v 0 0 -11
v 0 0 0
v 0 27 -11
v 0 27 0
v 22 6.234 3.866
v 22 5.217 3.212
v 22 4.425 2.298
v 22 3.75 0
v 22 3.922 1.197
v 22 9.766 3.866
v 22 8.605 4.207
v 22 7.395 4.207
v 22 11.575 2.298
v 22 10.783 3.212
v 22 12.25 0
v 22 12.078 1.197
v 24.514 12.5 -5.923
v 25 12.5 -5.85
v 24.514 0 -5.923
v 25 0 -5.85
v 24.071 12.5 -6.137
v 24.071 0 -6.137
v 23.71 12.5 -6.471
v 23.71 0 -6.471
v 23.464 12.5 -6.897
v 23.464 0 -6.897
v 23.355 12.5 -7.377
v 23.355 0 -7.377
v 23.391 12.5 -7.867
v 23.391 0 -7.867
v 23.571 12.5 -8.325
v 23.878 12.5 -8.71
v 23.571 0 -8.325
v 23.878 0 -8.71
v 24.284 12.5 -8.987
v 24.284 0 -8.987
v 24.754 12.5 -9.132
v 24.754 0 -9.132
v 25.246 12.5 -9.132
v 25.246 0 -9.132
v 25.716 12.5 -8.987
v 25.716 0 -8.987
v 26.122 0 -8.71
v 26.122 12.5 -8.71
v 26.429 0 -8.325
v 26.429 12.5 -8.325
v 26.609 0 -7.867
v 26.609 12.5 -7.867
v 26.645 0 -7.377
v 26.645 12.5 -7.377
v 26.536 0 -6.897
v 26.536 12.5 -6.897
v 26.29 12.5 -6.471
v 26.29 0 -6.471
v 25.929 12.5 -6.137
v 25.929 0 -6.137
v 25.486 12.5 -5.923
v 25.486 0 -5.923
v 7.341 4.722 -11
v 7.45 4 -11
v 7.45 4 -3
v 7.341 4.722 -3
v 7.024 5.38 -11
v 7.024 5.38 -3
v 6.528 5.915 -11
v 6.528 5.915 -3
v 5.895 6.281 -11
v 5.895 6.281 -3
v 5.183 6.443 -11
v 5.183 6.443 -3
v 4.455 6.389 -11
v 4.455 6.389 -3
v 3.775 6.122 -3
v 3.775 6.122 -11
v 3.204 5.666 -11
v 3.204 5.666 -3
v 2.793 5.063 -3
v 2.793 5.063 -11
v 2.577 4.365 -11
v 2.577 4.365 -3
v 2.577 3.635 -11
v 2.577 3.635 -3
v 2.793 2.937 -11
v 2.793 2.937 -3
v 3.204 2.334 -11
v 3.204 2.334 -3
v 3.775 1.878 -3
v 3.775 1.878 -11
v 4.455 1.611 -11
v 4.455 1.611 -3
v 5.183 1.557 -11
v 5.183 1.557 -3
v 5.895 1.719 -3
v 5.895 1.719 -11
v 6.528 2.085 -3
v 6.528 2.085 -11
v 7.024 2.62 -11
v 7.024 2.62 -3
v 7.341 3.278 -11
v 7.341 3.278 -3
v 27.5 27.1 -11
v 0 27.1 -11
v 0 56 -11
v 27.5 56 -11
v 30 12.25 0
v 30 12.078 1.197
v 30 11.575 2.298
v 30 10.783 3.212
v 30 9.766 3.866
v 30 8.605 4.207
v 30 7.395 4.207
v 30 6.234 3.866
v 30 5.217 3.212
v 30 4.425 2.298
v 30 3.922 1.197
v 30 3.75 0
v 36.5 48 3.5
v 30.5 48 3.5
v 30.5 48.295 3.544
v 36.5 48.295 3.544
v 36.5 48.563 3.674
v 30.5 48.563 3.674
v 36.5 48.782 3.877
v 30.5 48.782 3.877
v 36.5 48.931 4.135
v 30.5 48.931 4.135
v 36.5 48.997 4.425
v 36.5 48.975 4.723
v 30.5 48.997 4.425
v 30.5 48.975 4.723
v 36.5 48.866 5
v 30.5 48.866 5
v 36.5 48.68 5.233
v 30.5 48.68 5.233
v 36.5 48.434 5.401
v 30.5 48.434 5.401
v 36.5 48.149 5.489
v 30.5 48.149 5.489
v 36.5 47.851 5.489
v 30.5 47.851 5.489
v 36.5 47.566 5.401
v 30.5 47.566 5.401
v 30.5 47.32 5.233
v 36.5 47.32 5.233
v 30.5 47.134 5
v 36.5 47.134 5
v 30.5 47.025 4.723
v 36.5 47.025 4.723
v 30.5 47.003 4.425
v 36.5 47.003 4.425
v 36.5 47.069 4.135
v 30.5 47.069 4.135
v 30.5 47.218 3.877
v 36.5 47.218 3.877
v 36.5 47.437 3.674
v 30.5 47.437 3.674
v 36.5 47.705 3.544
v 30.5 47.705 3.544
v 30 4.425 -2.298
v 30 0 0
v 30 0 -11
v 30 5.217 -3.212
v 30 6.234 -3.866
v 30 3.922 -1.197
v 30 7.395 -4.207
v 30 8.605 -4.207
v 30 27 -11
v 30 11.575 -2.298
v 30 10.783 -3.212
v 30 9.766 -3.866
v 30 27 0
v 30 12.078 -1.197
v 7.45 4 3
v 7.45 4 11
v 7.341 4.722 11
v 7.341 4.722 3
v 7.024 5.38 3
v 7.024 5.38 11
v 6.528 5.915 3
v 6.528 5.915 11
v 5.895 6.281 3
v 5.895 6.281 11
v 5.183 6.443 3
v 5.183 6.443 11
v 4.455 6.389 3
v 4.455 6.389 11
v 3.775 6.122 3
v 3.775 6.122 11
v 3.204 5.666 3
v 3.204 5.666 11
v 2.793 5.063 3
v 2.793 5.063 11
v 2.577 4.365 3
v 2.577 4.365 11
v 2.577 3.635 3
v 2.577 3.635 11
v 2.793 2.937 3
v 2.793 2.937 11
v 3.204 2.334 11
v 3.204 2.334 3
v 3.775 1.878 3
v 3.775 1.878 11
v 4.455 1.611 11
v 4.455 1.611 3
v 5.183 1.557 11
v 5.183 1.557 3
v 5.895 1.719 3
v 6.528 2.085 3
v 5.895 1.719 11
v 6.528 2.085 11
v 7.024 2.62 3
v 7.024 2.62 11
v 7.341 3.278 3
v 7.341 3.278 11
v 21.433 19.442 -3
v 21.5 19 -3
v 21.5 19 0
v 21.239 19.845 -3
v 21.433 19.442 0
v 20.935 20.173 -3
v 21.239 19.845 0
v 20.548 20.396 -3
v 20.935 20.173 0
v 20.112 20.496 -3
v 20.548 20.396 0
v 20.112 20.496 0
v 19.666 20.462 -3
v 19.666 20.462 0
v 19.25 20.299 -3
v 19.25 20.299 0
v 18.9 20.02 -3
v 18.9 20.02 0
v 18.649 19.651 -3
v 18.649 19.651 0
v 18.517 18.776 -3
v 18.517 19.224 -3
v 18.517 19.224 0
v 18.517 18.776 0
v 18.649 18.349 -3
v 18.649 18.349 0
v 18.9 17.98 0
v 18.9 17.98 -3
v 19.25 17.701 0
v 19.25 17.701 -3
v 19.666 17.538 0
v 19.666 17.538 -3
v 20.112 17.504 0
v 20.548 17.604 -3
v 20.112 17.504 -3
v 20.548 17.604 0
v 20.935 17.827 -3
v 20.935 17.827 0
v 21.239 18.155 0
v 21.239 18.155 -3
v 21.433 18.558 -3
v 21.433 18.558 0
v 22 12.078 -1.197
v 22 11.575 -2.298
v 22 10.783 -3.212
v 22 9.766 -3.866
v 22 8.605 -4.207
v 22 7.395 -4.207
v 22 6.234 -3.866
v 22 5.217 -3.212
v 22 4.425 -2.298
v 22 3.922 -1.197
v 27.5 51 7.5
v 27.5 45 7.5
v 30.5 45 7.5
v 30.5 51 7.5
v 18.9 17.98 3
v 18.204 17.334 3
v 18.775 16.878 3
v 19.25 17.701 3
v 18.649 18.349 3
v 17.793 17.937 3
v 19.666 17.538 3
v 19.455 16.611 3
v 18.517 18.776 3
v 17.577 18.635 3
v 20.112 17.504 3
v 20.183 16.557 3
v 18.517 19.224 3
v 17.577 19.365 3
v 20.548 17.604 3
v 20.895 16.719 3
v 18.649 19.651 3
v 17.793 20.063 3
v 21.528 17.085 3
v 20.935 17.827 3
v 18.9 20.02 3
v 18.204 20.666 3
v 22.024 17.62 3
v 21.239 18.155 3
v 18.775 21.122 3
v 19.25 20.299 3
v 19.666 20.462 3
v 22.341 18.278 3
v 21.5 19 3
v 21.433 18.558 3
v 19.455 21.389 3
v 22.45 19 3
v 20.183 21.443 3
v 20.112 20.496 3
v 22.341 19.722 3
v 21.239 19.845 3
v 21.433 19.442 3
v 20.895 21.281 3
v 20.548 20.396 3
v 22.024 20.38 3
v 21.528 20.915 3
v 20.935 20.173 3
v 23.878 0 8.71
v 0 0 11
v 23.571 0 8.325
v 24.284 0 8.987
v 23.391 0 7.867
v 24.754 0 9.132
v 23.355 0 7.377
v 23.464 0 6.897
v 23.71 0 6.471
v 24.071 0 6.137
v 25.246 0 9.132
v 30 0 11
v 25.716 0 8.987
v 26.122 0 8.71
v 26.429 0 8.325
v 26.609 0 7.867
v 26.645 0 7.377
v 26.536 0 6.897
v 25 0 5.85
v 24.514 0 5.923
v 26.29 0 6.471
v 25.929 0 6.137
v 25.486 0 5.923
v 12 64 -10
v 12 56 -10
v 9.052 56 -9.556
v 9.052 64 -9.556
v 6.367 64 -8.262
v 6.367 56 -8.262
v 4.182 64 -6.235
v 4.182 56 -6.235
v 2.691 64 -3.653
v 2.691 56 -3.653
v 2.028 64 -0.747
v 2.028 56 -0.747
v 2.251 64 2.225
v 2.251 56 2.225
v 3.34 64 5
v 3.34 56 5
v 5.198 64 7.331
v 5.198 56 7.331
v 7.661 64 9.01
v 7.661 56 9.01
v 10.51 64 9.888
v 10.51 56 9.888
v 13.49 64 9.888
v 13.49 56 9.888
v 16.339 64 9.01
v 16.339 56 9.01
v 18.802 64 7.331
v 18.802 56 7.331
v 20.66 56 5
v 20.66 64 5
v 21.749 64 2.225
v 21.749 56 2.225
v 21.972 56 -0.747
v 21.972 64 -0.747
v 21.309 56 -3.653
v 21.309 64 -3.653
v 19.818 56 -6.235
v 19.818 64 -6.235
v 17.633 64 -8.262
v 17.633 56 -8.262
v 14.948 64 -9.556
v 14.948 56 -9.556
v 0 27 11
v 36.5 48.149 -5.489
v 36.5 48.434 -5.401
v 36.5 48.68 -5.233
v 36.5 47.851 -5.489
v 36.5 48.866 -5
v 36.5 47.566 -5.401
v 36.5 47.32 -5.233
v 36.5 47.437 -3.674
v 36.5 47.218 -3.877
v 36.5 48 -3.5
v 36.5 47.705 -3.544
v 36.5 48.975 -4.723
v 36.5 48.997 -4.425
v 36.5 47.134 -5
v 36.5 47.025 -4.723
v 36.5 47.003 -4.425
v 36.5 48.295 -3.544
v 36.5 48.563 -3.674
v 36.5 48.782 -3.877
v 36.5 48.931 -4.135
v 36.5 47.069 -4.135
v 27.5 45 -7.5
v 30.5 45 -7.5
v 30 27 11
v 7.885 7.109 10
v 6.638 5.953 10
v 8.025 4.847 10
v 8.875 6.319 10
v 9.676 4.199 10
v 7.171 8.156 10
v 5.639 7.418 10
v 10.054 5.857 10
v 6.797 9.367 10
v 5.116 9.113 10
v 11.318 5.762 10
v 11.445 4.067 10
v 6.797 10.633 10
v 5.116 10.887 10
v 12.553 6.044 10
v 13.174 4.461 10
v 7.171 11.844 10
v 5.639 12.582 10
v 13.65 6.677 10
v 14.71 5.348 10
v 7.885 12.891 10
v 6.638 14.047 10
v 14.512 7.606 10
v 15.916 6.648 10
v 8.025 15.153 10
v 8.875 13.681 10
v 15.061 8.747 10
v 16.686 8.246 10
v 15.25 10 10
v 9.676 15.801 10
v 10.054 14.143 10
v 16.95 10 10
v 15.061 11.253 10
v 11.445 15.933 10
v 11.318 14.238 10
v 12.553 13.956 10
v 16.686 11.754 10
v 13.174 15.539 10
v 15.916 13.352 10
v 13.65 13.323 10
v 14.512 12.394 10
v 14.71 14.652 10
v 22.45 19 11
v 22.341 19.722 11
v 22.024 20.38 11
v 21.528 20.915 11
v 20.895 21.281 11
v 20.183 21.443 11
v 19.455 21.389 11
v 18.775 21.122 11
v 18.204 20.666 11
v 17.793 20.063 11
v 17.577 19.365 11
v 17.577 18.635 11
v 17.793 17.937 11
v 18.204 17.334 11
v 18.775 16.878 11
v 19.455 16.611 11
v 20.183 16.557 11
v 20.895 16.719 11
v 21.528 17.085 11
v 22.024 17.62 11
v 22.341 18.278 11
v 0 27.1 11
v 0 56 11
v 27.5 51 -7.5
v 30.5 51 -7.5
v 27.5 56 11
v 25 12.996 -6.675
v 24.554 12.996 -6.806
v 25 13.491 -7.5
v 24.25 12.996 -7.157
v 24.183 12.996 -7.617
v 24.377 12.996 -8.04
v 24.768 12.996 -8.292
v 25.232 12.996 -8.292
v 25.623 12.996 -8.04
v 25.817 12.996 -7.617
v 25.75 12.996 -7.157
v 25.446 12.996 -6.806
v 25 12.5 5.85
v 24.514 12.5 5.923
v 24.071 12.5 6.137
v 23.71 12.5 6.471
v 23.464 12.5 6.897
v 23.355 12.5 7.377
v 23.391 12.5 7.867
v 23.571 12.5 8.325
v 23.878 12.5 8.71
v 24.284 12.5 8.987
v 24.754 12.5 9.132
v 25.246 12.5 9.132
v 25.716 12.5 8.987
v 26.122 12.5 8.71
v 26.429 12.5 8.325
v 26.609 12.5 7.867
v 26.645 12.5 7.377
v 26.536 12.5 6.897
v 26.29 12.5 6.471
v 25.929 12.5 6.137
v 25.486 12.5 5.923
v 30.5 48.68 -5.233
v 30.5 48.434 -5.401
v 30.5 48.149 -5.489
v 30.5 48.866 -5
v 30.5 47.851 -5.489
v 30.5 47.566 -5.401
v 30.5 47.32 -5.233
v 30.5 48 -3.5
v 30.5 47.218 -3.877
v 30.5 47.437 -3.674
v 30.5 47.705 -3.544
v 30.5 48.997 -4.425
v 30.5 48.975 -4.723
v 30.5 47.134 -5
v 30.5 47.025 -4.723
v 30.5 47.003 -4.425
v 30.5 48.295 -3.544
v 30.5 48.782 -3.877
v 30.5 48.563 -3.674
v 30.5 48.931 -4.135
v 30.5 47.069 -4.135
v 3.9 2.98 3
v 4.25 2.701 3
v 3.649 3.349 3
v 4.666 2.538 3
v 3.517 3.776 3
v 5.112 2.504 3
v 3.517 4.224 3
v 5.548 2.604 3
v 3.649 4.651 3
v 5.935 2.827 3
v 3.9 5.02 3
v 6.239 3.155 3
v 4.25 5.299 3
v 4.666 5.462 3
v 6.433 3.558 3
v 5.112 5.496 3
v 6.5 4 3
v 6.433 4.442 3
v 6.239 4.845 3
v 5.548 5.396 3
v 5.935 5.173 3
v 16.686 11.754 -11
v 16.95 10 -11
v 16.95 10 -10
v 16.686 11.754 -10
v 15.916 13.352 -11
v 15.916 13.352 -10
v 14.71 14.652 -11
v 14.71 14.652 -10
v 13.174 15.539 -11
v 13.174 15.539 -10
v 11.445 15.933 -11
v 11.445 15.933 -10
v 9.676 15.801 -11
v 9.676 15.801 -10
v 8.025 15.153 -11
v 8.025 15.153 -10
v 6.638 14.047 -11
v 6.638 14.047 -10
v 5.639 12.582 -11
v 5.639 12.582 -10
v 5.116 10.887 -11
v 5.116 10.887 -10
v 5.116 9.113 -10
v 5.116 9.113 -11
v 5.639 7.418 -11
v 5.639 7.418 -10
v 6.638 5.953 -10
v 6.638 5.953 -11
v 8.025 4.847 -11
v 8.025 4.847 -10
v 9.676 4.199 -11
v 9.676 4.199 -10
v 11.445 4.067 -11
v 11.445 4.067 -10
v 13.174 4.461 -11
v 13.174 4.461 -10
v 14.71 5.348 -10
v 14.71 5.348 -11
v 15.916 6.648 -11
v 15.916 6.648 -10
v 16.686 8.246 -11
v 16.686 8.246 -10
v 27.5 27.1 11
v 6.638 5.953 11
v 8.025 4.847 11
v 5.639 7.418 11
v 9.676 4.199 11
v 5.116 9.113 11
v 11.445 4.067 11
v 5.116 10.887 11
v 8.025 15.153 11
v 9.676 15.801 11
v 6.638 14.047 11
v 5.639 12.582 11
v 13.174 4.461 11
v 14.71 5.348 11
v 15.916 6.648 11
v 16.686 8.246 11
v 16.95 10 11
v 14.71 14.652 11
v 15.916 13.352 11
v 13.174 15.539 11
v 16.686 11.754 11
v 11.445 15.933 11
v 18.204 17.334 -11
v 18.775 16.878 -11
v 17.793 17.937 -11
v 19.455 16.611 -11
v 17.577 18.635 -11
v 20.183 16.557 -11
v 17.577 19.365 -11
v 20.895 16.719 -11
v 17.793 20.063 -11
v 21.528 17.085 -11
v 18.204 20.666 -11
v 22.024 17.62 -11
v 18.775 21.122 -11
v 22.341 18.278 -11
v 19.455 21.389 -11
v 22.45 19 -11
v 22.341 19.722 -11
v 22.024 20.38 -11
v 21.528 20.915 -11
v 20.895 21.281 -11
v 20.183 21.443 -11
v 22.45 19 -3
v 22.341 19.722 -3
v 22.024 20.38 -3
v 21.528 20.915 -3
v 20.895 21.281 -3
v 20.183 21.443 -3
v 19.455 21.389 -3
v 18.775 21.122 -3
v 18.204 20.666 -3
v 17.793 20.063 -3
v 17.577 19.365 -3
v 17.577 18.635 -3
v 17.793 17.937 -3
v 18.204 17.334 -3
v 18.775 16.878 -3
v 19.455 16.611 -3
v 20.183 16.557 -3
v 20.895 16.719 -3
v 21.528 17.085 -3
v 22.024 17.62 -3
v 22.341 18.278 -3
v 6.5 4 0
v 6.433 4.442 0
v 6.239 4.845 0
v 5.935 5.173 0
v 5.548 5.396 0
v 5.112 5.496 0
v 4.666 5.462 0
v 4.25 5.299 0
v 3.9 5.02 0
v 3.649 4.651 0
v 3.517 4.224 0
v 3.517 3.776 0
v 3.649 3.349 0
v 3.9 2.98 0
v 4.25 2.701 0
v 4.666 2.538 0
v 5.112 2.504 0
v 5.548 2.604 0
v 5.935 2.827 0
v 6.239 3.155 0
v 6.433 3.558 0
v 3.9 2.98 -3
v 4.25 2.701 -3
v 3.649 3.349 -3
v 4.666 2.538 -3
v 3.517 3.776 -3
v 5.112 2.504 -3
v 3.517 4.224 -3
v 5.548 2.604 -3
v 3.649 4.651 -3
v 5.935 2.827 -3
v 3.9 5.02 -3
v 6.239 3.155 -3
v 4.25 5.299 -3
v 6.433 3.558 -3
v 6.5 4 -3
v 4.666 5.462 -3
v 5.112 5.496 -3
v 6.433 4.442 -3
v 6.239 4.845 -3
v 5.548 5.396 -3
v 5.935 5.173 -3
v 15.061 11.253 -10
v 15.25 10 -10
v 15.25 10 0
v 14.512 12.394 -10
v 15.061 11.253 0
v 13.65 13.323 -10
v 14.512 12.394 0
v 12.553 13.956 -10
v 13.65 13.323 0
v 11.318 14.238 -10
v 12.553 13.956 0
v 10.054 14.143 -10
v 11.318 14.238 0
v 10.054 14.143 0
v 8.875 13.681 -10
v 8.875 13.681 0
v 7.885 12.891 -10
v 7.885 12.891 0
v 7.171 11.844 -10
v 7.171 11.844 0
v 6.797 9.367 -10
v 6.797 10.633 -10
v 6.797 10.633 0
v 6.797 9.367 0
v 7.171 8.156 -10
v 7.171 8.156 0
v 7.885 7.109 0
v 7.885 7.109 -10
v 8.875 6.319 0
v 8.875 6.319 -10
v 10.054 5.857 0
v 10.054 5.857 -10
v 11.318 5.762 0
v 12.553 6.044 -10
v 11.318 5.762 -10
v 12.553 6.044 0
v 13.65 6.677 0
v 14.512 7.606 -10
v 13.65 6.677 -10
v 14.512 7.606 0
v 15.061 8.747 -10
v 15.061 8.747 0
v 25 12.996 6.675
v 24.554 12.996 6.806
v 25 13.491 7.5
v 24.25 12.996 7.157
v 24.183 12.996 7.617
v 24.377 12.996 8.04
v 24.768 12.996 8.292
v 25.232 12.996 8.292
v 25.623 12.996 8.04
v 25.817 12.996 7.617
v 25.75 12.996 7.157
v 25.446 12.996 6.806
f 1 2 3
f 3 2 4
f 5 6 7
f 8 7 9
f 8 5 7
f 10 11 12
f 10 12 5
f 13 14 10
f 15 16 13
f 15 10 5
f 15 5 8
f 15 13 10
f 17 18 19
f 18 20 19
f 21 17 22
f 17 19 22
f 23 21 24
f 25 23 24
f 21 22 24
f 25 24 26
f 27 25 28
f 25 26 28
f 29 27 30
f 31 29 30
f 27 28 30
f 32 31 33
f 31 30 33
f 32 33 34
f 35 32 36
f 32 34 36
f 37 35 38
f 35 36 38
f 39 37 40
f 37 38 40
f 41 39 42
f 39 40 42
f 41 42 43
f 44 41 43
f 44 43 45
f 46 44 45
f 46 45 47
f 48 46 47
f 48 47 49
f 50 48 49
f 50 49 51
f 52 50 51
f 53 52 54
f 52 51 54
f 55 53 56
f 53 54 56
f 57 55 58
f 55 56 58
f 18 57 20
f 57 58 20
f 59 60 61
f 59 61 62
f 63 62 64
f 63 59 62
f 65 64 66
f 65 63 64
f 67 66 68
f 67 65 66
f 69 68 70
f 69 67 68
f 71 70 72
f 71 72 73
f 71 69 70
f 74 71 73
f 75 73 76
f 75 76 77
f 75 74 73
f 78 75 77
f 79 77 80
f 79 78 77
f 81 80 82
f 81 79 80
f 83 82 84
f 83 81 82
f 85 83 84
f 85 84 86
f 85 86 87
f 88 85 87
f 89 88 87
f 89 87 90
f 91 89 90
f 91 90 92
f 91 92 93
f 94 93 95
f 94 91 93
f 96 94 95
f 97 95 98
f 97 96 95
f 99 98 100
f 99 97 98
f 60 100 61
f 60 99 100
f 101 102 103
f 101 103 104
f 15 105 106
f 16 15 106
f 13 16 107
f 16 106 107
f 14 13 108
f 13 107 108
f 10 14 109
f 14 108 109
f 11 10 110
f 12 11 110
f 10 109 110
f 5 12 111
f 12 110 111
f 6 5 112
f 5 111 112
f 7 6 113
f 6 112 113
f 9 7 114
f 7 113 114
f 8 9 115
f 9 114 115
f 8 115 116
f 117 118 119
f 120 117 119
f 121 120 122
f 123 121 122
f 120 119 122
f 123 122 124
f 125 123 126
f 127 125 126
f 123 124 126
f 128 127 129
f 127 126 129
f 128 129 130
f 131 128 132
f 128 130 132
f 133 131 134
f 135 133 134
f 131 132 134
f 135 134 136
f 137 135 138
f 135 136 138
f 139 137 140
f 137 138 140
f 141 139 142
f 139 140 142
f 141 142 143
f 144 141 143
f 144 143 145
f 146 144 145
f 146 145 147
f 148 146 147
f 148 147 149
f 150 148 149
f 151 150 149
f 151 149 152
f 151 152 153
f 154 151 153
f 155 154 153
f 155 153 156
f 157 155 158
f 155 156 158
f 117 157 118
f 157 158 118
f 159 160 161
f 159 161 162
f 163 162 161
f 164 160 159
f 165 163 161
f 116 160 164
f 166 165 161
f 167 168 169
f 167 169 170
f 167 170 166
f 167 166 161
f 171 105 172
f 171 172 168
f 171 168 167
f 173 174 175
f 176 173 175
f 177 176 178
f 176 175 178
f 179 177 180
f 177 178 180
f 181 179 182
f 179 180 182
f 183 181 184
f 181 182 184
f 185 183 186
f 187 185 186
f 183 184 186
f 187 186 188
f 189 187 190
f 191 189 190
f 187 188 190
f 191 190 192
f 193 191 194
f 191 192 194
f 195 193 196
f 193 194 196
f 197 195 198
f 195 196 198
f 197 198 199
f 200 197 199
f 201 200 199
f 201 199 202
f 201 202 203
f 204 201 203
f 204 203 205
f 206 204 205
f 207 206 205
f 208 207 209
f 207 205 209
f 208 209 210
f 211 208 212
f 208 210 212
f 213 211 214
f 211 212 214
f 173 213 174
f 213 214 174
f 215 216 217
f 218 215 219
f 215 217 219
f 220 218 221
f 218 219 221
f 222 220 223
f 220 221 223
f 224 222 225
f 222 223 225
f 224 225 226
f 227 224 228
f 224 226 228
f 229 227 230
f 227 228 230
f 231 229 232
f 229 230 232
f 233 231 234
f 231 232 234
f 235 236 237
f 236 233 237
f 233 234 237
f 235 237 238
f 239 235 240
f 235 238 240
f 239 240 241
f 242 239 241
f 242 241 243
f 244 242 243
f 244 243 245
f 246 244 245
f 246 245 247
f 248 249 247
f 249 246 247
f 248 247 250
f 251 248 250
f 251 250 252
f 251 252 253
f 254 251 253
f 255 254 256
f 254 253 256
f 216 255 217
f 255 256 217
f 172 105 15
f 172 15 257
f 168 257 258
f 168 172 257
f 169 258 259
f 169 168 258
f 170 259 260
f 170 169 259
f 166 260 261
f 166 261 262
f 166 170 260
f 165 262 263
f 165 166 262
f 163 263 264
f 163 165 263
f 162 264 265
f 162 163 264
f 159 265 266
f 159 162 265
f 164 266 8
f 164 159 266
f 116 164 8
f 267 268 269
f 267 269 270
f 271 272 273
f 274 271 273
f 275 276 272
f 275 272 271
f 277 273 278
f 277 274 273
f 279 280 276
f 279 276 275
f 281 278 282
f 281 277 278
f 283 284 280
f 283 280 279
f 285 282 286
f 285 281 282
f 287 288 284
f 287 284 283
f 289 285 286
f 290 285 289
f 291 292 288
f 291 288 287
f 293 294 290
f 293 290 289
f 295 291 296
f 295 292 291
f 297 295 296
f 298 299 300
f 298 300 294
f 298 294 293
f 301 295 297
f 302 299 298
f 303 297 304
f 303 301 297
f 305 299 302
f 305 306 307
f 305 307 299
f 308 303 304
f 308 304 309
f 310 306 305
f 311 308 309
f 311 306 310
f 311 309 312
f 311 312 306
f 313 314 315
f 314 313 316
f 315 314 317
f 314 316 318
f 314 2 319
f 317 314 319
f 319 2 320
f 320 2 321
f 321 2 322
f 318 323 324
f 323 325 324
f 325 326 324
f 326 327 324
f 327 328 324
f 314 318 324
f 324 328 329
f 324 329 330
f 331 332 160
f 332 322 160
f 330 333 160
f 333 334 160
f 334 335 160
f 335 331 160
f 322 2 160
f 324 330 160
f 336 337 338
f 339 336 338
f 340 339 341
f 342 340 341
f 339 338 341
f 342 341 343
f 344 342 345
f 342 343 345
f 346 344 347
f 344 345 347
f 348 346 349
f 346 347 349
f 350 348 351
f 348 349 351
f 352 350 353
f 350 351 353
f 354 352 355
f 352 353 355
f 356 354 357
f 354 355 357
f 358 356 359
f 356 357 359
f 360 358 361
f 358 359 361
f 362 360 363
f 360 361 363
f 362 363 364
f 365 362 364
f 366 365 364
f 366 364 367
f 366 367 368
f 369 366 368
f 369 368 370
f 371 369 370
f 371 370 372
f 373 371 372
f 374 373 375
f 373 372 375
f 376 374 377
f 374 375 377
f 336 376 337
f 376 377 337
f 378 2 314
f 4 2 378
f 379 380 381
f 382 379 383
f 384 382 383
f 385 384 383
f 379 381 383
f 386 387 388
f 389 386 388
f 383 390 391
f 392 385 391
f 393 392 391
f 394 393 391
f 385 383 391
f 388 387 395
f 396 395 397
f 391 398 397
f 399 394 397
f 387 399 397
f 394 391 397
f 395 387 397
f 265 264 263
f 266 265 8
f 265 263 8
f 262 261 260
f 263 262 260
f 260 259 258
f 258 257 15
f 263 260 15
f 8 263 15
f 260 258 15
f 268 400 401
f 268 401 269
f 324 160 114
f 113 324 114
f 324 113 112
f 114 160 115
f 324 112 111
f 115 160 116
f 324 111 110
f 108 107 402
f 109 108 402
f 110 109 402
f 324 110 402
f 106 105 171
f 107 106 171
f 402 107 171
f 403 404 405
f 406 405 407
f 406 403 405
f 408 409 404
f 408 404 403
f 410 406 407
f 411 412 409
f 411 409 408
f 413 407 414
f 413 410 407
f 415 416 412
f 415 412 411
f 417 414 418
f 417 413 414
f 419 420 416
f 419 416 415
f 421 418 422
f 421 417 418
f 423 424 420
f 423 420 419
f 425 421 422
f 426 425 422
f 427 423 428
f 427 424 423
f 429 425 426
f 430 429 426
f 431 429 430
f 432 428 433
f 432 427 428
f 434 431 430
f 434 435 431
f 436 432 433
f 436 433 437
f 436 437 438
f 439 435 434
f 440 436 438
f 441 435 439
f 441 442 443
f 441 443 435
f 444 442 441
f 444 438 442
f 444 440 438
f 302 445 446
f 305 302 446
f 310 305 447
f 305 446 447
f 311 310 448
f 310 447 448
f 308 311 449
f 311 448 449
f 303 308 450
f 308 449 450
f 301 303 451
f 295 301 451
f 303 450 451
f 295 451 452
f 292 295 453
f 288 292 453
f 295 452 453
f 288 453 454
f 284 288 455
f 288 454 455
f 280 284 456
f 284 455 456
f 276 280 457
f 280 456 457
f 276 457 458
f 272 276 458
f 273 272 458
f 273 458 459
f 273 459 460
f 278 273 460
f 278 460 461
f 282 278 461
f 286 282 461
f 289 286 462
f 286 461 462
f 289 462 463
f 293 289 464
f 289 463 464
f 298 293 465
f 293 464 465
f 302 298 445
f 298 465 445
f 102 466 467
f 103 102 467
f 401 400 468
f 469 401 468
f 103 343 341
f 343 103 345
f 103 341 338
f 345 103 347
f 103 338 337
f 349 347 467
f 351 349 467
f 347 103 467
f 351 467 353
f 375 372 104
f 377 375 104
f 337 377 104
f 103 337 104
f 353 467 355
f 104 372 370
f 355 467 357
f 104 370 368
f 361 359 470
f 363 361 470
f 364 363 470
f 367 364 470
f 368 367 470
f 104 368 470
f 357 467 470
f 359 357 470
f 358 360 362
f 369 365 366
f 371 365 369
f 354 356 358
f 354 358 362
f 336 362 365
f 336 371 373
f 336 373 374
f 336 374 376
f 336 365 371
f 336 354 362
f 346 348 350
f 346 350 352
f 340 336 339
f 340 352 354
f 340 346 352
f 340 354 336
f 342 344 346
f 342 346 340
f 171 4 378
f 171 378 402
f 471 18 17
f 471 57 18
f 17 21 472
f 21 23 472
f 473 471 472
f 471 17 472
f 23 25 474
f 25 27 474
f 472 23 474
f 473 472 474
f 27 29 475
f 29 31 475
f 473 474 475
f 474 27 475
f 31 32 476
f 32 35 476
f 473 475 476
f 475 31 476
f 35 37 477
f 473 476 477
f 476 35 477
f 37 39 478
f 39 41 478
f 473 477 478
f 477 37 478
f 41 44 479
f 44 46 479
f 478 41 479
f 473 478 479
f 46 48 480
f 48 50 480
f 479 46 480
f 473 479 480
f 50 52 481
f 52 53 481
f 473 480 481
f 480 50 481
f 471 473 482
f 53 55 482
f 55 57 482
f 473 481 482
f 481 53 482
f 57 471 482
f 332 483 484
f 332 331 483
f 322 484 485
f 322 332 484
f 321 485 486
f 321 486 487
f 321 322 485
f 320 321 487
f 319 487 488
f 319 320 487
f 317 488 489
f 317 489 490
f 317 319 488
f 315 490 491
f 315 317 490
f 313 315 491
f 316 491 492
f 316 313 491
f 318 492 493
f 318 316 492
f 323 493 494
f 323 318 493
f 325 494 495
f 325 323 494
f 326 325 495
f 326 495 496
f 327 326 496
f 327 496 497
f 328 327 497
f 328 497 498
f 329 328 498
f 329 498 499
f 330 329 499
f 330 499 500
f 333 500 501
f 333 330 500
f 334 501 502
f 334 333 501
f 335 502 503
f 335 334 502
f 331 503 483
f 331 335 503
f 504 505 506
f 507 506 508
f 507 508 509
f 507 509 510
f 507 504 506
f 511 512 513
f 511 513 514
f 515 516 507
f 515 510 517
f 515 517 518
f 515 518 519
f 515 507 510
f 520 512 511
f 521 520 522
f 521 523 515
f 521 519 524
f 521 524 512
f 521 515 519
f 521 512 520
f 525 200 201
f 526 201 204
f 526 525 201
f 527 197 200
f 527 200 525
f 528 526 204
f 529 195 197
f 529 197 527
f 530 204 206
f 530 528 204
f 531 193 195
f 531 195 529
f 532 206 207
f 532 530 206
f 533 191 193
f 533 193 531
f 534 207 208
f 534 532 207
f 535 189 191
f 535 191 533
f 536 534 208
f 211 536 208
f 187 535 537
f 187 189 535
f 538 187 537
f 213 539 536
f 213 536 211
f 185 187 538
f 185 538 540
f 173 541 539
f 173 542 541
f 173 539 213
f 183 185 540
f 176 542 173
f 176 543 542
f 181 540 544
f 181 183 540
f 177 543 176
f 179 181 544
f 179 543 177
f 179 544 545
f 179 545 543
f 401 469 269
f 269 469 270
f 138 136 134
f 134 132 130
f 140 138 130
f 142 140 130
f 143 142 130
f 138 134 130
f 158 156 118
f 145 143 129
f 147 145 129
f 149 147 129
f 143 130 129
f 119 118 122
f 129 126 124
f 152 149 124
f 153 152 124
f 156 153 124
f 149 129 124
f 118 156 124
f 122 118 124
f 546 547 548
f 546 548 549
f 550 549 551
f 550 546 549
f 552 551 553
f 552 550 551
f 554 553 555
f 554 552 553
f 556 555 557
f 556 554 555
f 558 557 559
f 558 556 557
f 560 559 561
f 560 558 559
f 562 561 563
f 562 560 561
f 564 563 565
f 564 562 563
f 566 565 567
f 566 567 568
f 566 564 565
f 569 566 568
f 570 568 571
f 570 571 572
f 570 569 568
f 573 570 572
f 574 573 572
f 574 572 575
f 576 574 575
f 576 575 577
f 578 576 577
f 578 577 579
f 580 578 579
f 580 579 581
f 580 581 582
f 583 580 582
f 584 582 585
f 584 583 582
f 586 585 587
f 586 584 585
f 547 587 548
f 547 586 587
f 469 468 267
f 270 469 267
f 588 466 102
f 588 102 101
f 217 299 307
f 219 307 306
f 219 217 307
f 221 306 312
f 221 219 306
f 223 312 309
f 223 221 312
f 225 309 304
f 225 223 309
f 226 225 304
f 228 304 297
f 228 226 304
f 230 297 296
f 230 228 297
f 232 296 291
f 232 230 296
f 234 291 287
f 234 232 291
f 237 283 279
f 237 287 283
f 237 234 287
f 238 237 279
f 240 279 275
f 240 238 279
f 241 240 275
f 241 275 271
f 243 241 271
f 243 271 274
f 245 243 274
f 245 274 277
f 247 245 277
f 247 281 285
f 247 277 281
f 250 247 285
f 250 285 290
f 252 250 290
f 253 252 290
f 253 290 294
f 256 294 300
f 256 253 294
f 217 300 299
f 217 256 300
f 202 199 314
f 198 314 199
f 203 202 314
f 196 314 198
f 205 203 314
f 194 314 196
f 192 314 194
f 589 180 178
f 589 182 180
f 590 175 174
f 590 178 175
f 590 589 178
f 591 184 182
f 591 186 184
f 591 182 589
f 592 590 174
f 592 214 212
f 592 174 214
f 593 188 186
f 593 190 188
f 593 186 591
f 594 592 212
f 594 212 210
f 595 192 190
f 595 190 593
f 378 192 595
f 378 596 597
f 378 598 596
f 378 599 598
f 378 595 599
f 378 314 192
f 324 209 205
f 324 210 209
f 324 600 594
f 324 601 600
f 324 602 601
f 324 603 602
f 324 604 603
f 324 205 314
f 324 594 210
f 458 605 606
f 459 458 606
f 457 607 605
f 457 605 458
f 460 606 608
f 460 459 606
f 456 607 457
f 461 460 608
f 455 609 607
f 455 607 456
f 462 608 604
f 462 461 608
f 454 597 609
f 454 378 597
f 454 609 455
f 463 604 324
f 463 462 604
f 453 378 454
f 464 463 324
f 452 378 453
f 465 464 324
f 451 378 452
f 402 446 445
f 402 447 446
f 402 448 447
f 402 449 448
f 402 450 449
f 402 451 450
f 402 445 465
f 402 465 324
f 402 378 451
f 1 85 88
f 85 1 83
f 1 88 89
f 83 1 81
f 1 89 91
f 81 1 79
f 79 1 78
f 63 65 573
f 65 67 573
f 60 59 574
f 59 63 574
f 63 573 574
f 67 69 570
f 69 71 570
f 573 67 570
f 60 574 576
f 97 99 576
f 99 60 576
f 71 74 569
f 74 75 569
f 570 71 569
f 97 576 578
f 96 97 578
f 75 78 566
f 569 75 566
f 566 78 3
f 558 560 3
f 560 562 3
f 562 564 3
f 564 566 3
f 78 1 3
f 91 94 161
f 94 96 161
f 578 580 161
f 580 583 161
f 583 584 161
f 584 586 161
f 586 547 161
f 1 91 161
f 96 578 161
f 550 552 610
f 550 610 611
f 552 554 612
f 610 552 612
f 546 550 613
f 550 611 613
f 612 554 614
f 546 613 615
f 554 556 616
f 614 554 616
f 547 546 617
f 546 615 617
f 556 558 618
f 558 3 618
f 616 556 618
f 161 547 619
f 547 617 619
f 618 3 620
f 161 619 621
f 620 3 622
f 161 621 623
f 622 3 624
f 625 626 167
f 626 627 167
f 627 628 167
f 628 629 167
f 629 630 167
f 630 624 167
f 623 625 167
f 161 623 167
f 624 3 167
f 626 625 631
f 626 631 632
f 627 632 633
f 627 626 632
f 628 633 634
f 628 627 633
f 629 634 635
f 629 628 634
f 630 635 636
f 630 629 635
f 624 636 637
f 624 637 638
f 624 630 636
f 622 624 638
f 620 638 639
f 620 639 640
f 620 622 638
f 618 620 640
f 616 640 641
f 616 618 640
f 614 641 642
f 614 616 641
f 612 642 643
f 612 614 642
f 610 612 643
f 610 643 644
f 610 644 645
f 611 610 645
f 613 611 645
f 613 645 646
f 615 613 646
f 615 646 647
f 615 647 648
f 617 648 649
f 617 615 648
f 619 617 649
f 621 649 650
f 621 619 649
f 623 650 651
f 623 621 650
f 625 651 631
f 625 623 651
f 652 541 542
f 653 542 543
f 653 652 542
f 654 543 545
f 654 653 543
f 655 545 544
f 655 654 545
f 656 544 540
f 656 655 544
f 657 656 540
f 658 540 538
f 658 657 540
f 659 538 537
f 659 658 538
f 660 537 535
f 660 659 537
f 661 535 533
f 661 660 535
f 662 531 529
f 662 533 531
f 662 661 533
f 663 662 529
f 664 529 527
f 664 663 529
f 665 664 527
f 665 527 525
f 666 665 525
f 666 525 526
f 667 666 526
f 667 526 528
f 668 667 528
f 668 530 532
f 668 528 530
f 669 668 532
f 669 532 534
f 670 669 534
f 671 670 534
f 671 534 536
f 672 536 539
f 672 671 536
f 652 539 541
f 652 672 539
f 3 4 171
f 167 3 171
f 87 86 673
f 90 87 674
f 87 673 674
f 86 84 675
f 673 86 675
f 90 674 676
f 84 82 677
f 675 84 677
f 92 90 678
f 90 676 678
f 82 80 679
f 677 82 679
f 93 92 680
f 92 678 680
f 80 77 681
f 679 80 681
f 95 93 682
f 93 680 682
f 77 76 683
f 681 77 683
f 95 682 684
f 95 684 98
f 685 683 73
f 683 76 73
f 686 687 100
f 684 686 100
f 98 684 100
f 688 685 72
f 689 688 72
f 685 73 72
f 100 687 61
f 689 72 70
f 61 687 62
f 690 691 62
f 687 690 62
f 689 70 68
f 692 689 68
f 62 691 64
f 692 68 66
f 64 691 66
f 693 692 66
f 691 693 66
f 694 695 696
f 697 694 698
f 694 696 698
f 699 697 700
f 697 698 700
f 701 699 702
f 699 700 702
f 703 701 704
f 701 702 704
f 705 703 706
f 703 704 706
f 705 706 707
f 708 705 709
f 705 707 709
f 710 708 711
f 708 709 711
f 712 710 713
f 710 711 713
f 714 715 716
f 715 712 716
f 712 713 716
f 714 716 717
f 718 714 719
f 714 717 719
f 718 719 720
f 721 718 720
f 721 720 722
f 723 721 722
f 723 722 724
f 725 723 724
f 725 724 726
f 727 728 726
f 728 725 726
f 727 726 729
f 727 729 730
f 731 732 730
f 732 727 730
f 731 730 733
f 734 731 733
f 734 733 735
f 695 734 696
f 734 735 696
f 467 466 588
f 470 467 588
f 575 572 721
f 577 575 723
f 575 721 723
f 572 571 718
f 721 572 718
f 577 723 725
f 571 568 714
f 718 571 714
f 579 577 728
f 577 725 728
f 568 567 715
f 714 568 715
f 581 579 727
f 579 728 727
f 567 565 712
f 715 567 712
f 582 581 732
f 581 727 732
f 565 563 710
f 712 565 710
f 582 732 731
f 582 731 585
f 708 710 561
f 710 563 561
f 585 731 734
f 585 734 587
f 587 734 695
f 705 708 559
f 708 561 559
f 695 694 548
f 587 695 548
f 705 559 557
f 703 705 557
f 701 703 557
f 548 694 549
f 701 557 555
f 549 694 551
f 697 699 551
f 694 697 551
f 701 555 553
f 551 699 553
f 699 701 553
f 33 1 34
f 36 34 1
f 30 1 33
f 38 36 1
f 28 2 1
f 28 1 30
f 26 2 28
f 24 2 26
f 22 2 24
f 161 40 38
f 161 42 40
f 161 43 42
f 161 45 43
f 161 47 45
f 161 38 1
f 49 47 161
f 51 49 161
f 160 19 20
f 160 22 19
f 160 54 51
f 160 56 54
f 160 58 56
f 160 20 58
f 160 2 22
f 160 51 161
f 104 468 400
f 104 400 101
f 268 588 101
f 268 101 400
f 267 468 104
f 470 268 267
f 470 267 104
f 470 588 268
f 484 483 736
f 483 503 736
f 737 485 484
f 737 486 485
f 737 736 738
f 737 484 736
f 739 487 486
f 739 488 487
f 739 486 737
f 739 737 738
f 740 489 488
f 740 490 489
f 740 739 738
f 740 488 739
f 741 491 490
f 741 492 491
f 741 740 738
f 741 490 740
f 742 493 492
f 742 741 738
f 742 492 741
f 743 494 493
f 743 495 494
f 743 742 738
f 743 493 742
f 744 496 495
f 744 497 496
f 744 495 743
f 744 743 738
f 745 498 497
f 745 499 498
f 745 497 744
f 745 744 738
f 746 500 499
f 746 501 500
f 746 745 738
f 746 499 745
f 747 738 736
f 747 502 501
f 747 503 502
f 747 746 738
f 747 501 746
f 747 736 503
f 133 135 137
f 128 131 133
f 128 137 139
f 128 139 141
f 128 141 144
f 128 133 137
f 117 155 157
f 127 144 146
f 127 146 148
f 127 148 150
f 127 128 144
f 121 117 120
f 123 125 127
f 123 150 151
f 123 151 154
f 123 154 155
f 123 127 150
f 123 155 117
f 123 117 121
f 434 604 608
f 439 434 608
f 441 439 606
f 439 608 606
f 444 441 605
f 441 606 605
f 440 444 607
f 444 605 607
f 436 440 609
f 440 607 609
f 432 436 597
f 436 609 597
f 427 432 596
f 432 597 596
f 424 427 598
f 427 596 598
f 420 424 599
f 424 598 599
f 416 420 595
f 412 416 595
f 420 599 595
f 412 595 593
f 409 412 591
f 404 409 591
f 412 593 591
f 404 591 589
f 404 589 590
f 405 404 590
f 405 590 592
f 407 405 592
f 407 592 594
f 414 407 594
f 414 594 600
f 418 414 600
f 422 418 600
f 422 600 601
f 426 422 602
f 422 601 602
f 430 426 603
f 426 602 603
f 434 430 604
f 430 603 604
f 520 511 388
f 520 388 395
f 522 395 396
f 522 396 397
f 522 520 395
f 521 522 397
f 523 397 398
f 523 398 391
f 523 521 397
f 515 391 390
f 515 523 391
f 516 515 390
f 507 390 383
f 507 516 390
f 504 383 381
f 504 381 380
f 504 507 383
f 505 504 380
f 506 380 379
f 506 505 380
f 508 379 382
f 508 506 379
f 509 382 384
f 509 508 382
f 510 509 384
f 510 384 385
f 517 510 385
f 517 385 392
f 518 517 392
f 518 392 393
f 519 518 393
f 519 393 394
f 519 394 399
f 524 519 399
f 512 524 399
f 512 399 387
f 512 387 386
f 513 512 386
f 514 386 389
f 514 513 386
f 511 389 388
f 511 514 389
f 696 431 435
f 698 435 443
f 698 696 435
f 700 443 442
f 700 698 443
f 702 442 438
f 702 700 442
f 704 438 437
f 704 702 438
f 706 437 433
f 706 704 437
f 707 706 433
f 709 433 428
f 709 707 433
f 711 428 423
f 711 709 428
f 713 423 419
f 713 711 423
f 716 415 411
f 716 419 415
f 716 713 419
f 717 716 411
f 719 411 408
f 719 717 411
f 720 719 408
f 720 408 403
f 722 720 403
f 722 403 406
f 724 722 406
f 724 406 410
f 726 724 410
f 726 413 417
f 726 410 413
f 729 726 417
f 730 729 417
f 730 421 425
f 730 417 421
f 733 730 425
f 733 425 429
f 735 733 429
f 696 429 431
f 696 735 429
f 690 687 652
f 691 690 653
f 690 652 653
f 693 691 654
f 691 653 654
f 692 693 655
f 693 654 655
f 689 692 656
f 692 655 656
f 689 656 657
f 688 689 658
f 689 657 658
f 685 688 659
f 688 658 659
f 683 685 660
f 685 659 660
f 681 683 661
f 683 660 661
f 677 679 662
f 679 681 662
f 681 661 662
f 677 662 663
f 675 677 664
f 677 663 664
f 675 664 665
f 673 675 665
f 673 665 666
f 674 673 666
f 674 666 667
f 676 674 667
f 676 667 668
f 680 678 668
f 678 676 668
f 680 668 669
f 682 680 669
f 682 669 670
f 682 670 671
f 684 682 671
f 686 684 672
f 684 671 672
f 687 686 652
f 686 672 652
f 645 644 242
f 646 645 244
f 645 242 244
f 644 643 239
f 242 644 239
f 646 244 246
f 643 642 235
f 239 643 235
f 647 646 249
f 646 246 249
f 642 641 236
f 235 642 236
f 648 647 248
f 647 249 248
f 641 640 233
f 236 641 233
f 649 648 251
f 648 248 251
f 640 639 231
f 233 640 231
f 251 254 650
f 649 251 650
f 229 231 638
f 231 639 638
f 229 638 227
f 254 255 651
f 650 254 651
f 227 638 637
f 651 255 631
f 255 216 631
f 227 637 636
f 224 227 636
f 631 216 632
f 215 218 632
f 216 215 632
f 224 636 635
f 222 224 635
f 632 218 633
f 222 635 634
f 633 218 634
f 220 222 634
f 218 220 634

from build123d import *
from build123d.topology import SkipClean

# Parameters (mm, degrees)
ESQUISSE1_W             = 30
ESQUISSE1_H             = 27
ESQUISSE1_R             = 4.25
ESQUISSE1_R_2           = 1.5
BOSS_EXTRU_1_DEPTH      = 11
ESQUISSE1_W_2           = 27.5
ESQUISSE1_H_2           = 28.9
BOSS_EXTRU_1_2_DEPTH    = 11
ESQUISSE2_R             = 2.45
ENL_V_MAT_EXTRU_1_DEPTH = 8
ESQUISSE3_R             = 5.95
ENL_V_MAT_EXTRU_2_DEPTH = 1
ESQUISSE4_R             = 4.25
ENL_V_MAT_EXTRU_3_DEPTH = 8
ESQUISSE5_W             = 7.5
ESQUISSE5_H             = 6
BOSS_EXTRU_2_DEPTH      = 3
ESQUISSE6_R             = 1
BOSS_EXTRU_3_DEPTH      = 6
ESQUISSE9_R             = 10
BOSS_EXTRU_4_DEPTH      = 8


with BuildPart() as part:
    # Esquisse1 → Boss.-Extru.1 (new body)
    with BuildSketch(Plane.XY):
        with Locations((15, 13.5)):
            Rectangle(ESQUISSE1_W, ESQUISSE1_H)
        with Locations((11, 10)):
            Circle(ESQUISSE1_R, mode=Mode.SUBTRACT)
        with Locations((20, 19)):
            Circle(ESQUISSE1_R_2, mode=Mode.SUBTRACT)
        with Locations((5, 4)):
            Circle(ESQUISSE1_R_2, mode=Mode.SUBTRACT)
    extrude(amount=BOSS_EXTRU_1_DEPTH)

    # Esquisse2 → Enlèv. mat.-Extru.1 (cut)
    with BuildSketch(Plane.XY.offset(11)):
        with Locations((20, 19)):
            Circle(ESQUISSE2_R)
        with Locations((5, 4)):
            Circle(ESQUISSE2_R)
    extrude(amount=-ENL_V_MAT_EXTRU_1_DEPTH, mode=Mode.SUBTRACT)

    # Esquisse3 → Enlèv. mat.-Extru.2 (cut)
    with BuildSketch(Plane.XY.offset(11)):
        with Locations((11, 10)):
            Circle(ESQUISSE3_R)
    extrude(amount=-ENL_V_MAT_EXTRU_2_DEPTH, mode=Mode.SUBTRACT)

    # Esquisse4 → Enlèv. mat.-Extru.3 (cut)
    with BuildSketch(Plane(origin=(30, 0, 0), x_dir=(0, 0, -1), z_dir=(1, 0, 0))):
        with Locations((0, 8)):
            Circle(ESQUISSE4_R)
    extrude(amount=-ENL_V_MAT_EXTRU_3_DEPTH, mode=Mode.SUBTRACT)

    # Esquisse7 → Trou taraudé M4x0.71 (revolve, cut)
    with BuildSketch(Plane(origin=(25, 0, 7.5), x_dir=(0, 0, -1), z_dir=(1, 0, 0))):
        Polygon((0, 0), (0, 13.491420021), (1.65, 12.5), (1.65, 0), align=None)
    revolve(axis=Axis((25, -6.35, 7.5), (0, 1, 0)), mode=Mode.SUBTRACT)

    # Sym_trie1 2: part across plane


with BuildPart() as body_2:
    # Esquisse1 → Boss.-Extru.1 2 (new body)
    with BuildSketch(Plane.XY):
        with Locations((13.75, 41.55)):
            Rectangle(ESQUISSE1_W_2, ESQUISSE1_H_2)
    extrude(amount=BOSS_EXTRU_1_2_DEPTH)

    # Esquisse5 → Boss.-Extru.2 (add)
    with BuildSketch(Plane(origin=(27.5, 0, 0), x_dir=(0, 0, -1), z_dir=(1, 0, 0))):
        with Locations((-3.75, 48)):
            Rectangle(ESQUISSE5_W, ESQUISSE5_H)
    extrude(amount=BOSS_EXTRU_2_DEPTH)

    # Symétrie1: body 2 across plane


with BuildPart() as body_3:
    # Esquisse6 → Boss.-Extru.3 (new body)
    with BuildSketch(Plane(origin=(30.5, 0, 0), x_dir=(0, 0, -1), z_dir=(1, 0, 0))):
        with Locations((-4.5, 48)):
            Circle(ESQUISSE6_R)
    extrude(amount=BOSS_EXTRU_3_DEPTH)


with BuildPart() as body_2_1:
    add(body_2.part)
    add(body_2.part.mirror(Plane(origin=(0, 0, 0), x_dir=(1, 0, 0), z_dir=(0, 0, -1))))

    # Esquisse9 → Boss.-Extru.4 (add)
    with BuildSketch(Plane(origin=(0, 56, 0), x_dir=(1, 0, 0), z_dir=(0, 1, 0))):
        with Locations(Location((12, 0, 0), (0, 0, 90))):
            Circle(ESQUISSE9_R)
    extrude(amount=BOSS_EXTRU_4_DEPTH)


with BuildPart() as part_1:
    with SkipClean():  # the faces are left unmerged after this step: merging them gives an invalid solid
        add(part.part)
        add(part.part.mirror(Plane(origin=(0, 0, 0), x_dir=(1, 0, 0), z_dir=(0, 0, -1))))


with BuildPart() as body_4:
    # Symétrie2: mirrored copy
    add(body_3.part.mirror(Plane.XY))


solid = Compound([body_3.part, body_2_1.part, part_1.part, body_4.part])
